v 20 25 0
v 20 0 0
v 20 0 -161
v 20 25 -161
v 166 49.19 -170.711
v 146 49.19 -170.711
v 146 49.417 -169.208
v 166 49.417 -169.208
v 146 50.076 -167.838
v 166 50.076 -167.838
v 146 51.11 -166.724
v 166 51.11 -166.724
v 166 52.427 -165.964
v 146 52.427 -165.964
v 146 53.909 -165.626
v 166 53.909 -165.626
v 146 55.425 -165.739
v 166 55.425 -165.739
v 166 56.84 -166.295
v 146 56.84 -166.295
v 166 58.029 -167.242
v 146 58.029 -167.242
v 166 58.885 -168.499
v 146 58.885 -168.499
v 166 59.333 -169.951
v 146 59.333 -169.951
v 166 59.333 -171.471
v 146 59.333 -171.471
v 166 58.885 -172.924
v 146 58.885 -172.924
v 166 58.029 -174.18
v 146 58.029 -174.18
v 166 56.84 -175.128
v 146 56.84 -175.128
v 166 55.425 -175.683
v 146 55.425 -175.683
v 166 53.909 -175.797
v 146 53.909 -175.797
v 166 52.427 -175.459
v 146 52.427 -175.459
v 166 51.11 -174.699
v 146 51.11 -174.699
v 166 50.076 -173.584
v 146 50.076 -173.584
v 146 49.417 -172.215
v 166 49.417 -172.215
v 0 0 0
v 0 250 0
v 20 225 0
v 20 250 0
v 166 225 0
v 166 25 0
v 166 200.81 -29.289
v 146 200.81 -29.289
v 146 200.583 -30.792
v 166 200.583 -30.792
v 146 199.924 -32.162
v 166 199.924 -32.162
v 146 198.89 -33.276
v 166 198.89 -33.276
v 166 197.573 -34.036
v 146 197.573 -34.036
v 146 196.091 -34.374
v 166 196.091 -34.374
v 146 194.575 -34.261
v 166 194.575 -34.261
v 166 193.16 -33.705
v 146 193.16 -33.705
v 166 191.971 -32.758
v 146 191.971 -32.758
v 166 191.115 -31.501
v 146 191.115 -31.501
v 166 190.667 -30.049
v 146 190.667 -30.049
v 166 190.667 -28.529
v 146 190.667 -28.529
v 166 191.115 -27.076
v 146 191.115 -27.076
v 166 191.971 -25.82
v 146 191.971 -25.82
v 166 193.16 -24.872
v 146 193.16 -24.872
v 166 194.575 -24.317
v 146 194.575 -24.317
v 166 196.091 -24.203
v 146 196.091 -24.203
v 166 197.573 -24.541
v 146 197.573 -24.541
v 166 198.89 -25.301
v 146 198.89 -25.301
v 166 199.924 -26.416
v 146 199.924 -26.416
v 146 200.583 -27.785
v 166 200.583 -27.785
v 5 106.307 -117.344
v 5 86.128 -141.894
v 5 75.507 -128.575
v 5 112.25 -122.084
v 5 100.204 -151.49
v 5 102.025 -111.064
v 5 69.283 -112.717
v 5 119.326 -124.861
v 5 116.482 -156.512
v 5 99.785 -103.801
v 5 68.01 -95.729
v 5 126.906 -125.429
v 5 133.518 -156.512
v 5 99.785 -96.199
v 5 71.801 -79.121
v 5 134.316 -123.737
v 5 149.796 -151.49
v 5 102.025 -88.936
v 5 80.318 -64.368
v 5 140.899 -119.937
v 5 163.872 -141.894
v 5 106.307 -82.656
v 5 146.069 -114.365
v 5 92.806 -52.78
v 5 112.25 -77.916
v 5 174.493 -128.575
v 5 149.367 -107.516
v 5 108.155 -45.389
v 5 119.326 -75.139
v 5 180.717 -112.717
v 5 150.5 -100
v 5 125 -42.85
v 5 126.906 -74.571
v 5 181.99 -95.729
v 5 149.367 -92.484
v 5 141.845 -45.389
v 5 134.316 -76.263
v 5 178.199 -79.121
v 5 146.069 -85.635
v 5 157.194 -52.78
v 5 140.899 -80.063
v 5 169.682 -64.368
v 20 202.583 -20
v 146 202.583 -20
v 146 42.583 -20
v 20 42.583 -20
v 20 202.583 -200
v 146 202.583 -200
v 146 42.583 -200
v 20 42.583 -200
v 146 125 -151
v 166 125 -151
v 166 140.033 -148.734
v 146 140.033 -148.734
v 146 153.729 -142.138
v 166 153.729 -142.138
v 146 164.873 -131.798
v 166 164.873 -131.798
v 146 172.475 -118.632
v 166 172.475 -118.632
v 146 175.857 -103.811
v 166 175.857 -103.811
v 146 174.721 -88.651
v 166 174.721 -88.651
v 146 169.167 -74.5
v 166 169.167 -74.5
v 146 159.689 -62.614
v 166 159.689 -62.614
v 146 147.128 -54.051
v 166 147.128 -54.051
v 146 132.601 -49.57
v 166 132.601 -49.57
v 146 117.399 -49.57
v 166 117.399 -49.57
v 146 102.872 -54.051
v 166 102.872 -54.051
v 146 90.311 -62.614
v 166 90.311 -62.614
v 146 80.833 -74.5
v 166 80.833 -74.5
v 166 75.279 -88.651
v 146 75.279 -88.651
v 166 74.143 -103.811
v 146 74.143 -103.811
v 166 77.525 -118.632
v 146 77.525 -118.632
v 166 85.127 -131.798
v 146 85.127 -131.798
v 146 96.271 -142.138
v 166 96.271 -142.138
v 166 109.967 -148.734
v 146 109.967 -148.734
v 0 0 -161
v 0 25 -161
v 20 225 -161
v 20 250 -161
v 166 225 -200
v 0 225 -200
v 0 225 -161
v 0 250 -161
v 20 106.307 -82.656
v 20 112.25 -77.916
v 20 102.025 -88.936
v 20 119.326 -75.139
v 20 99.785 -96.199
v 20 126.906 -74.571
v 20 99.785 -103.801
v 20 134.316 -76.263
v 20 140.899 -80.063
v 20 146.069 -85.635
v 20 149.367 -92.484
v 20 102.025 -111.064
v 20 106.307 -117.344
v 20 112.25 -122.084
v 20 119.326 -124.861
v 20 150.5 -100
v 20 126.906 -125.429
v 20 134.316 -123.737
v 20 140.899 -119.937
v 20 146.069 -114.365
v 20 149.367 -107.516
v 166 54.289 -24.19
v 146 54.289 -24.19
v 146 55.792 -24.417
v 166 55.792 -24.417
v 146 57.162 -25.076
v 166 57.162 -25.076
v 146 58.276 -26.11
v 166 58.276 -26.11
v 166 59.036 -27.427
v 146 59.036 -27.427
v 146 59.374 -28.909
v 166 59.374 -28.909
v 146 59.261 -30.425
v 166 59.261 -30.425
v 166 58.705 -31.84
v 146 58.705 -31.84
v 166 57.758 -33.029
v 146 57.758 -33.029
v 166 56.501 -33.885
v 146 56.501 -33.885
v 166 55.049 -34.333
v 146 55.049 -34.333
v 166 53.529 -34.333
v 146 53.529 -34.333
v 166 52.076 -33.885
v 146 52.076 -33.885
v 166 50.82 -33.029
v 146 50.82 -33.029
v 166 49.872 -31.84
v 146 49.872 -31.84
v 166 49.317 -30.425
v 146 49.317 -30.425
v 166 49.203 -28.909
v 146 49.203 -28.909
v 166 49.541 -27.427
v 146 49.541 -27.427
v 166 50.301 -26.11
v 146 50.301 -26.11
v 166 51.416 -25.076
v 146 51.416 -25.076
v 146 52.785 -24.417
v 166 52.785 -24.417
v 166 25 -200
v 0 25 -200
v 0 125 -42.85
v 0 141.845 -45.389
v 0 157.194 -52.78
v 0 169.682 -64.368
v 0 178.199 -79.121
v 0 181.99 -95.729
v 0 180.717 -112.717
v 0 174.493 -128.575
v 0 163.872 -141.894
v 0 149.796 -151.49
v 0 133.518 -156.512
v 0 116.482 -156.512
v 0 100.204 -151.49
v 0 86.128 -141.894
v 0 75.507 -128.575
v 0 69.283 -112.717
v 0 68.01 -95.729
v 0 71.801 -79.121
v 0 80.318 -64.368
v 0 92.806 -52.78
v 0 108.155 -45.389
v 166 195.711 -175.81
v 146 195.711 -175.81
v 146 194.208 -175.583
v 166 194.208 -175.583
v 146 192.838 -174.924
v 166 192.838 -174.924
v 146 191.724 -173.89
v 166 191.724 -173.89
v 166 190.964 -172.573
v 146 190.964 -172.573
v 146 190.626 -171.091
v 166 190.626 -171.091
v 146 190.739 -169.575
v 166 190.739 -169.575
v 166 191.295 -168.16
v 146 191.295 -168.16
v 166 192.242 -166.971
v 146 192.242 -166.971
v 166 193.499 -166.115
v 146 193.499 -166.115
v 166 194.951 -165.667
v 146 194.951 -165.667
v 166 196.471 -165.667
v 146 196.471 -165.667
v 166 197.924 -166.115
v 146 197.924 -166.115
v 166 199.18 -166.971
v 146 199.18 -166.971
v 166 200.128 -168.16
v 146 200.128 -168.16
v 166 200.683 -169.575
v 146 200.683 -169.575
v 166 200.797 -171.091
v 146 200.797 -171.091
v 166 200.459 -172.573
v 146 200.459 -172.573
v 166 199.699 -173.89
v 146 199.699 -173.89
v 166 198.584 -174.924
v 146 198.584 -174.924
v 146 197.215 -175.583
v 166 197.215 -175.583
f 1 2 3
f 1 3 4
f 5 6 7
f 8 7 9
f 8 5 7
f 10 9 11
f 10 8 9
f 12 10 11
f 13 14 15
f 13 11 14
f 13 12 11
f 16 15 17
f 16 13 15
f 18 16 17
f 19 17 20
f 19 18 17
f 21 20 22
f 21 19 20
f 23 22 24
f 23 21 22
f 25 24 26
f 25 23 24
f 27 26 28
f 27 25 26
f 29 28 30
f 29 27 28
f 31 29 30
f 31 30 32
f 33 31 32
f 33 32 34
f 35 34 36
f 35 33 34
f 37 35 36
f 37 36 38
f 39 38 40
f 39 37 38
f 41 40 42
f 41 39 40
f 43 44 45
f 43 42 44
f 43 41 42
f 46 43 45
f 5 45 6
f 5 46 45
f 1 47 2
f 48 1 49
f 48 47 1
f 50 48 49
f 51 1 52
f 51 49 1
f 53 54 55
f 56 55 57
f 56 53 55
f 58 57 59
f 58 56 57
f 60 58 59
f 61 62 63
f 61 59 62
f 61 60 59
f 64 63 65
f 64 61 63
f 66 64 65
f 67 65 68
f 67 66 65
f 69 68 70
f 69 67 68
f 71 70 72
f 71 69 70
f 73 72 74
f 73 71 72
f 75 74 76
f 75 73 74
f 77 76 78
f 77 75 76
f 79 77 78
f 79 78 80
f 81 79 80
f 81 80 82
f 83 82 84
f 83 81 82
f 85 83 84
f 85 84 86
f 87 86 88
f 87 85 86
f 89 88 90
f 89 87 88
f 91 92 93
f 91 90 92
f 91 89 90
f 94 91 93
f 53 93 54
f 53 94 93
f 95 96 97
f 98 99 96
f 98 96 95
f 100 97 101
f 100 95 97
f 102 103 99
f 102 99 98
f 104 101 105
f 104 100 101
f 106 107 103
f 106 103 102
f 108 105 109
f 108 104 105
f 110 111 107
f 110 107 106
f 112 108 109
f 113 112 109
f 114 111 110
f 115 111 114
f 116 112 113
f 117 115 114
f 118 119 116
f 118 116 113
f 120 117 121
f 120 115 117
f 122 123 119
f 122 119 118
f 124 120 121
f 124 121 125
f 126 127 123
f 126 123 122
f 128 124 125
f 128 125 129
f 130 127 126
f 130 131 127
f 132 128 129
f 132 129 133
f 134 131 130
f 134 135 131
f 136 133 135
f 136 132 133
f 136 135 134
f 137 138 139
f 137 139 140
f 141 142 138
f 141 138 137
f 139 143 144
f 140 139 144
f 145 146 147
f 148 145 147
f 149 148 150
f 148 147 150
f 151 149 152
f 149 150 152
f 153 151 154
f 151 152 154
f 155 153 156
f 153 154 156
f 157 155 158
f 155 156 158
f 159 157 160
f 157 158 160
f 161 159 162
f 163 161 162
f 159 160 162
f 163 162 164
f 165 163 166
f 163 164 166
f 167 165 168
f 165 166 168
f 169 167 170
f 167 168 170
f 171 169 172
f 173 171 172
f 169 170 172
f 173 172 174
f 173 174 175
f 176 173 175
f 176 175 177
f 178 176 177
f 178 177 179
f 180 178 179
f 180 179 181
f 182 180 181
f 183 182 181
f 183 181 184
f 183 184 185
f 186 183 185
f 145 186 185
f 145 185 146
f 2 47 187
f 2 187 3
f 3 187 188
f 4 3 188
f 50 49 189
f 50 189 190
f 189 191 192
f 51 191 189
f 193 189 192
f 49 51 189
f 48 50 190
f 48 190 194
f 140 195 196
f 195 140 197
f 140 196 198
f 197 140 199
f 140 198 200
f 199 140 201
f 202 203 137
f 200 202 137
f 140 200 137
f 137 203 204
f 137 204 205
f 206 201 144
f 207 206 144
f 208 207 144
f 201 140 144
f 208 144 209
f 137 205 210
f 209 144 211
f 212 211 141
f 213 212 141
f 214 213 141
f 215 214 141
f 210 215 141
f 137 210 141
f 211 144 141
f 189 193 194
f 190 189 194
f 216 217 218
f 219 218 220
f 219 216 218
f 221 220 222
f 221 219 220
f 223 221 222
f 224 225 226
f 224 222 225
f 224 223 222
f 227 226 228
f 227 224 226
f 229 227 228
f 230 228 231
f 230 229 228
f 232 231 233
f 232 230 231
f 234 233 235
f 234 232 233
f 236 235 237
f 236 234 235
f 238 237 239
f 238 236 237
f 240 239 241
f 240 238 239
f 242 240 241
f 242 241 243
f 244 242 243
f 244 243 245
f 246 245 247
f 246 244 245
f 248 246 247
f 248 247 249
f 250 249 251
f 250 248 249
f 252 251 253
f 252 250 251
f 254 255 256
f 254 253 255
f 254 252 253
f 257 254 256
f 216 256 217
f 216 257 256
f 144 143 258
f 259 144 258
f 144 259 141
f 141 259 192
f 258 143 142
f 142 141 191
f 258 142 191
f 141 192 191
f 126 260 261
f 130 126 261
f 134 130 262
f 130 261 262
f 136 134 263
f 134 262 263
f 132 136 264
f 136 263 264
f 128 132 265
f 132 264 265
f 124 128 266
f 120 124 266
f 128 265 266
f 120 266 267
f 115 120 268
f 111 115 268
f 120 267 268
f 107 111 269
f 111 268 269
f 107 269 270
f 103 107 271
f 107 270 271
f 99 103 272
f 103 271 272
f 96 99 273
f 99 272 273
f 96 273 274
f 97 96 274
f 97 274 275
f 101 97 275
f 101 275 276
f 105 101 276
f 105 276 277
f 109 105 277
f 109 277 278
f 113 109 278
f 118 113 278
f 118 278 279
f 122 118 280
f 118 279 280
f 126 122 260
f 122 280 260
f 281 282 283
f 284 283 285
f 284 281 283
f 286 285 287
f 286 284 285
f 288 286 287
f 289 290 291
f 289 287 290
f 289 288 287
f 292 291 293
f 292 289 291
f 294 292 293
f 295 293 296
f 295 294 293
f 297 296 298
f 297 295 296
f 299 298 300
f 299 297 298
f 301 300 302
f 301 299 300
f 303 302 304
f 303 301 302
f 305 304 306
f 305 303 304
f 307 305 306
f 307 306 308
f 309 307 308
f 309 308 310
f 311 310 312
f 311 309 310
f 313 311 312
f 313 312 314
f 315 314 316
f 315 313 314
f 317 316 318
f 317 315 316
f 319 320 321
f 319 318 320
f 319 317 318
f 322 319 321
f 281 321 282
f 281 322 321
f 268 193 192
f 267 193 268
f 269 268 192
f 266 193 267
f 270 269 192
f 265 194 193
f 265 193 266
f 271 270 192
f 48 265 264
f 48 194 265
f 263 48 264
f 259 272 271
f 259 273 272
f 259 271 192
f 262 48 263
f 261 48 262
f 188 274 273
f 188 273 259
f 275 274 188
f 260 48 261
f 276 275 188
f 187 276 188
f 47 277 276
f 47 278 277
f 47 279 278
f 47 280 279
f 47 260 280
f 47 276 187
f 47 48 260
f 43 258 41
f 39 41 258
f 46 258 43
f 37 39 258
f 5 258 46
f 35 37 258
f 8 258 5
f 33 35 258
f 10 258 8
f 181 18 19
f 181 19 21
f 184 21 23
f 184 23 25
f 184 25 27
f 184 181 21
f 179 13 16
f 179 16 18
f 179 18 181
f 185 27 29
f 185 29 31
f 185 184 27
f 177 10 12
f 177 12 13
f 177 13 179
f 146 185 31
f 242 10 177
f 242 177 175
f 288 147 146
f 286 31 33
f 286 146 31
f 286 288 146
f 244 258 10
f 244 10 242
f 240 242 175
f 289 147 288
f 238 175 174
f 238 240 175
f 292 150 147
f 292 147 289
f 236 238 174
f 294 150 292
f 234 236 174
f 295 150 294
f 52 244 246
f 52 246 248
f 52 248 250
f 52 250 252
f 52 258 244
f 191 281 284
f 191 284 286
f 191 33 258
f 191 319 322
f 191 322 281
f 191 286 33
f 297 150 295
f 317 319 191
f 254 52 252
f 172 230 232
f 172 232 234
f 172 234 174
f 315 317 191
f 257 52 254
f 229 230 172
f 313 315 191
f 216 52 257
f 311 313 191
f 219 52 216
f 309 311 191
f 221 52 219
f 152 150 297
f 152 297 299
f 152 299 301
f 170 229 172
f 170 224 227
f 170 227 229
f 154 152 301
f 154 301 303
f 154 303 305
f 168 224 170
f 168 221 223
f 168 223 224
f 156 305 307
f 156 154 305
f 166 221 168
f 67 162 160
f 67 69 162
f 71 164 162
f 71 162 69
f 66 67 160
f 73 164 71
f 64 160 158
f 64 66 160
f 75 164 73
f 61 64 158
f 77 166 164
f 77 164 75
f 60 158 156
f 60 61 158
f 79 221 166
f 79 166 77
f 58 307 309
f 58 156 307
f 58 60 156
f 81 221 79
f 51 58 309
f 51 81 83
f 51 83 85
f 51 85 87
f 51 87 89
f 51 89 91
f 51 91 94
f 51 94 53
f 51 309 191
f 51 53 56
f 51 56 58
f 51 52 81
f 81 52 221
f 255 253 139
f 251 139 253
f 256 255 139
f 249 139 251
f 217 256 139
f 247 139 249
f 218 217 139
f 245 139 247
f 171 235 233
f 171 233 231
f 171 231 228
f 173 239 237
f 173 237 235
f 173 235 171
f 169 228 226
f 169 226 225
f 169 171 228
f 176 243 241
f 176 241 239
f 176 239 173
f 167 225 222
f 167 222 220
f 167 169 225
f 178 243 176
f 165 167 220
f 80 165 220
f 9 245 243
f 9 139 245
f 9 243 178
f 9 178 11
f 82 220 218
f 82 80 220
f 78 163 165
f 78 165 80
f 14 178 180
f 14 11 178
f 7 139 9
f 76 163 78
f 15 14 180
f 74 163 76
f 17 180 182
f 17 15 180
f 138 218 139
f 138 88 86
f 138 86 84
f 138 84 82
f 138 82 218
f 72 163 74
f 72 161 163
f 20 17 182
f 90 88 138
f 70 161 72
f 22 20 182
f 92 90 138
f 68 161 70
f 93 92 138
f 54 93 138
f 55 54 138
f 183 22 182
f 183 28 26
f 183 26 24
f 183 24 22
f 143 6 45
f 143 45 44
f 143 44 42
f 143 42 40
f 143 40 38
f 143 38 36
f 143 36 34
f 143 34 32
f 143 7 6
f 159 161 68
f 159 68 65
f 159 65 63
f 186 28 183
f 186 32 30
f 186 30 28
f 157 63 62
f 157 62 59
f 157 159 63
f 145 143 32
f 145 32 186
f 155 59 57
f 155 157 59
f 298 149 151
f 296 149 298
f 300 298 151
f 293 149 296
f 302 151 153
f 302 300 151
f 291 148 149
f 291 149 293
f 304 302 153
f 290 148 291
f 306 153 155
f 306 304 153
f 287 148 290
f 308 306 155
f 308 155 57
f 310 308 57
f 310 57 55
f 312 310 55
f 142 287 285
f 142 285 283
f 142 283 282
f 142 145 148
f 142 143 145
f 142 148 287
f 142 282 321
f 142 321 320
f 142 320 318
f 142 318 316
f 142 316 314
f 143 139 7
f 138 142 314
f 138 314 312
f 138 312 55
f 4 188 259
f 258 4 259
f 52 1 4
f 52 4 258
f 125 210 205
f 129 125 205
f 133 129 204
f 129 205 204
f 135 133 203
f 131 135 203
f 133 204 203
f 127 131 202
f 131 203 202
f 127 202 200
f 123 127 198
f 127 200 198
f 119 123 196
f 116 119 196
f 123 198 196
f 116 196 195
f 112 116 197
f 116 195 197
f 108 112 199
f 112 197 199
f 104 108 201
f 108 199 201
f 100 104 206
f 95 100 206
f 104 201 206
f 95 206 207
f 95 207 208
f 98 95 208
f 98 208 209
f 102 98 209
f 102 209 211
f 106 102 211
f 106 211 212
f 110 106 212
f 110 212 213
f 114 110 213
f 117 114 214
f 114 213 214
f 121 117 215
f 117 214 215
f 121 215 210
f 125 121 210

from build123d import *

# Parameters (mm, degrees)
EXTRUDE_1_DEPTH          = 200
SKETCH_2_W               = 39
SKETCH_2_H               = 25
CUT_EXTRUDE_1_DEPTH      = 20
SKETCH_3_W               = 126
SKETCH_3_H               = 160
CUT_EXTRUDE_2_DEPTH      = 180
CUT_EXTRUDE_3_REACH      = 362.633
SKETCH_4_R               = 51
SKETCH_5_R               = 25.5
CUT_EXTRUDE_4_DEPTH      = 15
SKETCH_6_R               = 57.15
CUT_EXTRUDE_5_DEPTH      = 5
PATTERN_CIRCULAR_1_COUNT = 4


with BuildPart() as part:
    # 草图1 → 凸台-拉伸1 (new body)
    with BuildSketch(Plane.XY):
        Polygon((20, 225), (20, 250), (0, 250), (0, 0), (20, 0), (20, 25), (166, 25), (166, 225), align=None)
    extrude(amount=-EXTRUDE_1_DEPTH)

    # 草图2 → 切除-拉伸1 (cut)
    with BuildSketch(Plane.ZY):
        with Locations((-180.5, 237.5)):
            Rectangle(SKETCH_2_W, SKETCH_2_H)
        with Locations((-180.5, 12.5)):
            Rectangle(SKETCH_2_W, SKETCH_2_H)
    extrude(amount=-CUT_EXTRUDE_1_DEPTH, mode=Mode.SUBTRACT)

    # 草图3 → 切除-拉伸2 (cut)
    with BuildSketch(Plane(origin=(0, 0, -200), x_dir=(-1, 0, 0), z_dir=(0, 0, -1))):
        with Locations((-83, 122.583335177)):
            Rectangle(SKETCH_3_W, SKETCH_3_H)
    extrude(amount=-CUT_EXTRUDE_2_DEPTH, mode=Mode.SUBTRACT)

    # 草图4 → 切除-拉伸3 (cut, up to next)
    with BuildSketch(Plane(origin=(166, 0, 0), x_dir=(0, 0, -1), z_dir=(1, 0, 0)), mode=Mode.PRIVATE) as cut_extrude_3_sk1:
        with Locations((100, 125)):
            Circle(SKETCH_4_R)
    cut_extrude_3_tool1 = extrude(cut_extrude_3_sk1.sketch, amount=-CUT_EXTRUDE_3_REACH, mode=Mode.PRIVATE) & part.part
    add(cut_extrude_3_tool1.solids().sort_by_distance((166, 125, -100))[0], mode=Mode.SUBTRACT)

    # 草图5 → 切除-拉伸4 (cut)
    with BuildSketch(Plane(origin=(20, 0, 0), x_dir=(0, 0, -1), z_dir=(1, 0, 0))):
        with Locations(Location((100, 125, 0), (0, 0, 90))):
            Circle(SKETCH_5_R)
    extrude(amount=-CUT_EXTRUDE_4_DEPTH, mode=Mode.SUBTRACT)

    # 草图6 → 切除-拉伸5 (cut)
    with BuildSketch(Plane.ZY):
        with Locations((-100, 125)):
            Circle(SKETCH_6_R)
    extrude(amount=-CUT_EXTRUDE_5_DEPTH, mode=Mode.SUBTRACT)

    # 草图9 → M12 螺纹孔1 (revolve, cut)
    with BuildSketch(Plane(origin=(166, 195.711356231, -170.71), x_dir=(0, 0, -1), z_dir=(0, 1, 0))):
        Polygon((0, 0), (0, 29.25), (5.1, 26.185610843), (5.1, 0), align=None)
    hole_wizard_m12_1 = revolve(axis=Axis((172.35, 195.711356231, -170.71), (-1, 0, 0)), mode=Mode.SUBTRACT)

    # 阵列(圆周)1: M12 螺纹孔1 ×4 about axis
    pattern_circular_1_axis = Axis((0, 125, -100), (1, 0, 0))
    for i in range(1, PATTERN_CIRCULAR_1_COUNT):
        add(hole_wizard_m12_1.rotate(pattern_circular_1_axis, i * 360 / PATTERN_CIRCULAR_1_COUNT), mode=Mode.SUBTRACT)


solid = part.part
